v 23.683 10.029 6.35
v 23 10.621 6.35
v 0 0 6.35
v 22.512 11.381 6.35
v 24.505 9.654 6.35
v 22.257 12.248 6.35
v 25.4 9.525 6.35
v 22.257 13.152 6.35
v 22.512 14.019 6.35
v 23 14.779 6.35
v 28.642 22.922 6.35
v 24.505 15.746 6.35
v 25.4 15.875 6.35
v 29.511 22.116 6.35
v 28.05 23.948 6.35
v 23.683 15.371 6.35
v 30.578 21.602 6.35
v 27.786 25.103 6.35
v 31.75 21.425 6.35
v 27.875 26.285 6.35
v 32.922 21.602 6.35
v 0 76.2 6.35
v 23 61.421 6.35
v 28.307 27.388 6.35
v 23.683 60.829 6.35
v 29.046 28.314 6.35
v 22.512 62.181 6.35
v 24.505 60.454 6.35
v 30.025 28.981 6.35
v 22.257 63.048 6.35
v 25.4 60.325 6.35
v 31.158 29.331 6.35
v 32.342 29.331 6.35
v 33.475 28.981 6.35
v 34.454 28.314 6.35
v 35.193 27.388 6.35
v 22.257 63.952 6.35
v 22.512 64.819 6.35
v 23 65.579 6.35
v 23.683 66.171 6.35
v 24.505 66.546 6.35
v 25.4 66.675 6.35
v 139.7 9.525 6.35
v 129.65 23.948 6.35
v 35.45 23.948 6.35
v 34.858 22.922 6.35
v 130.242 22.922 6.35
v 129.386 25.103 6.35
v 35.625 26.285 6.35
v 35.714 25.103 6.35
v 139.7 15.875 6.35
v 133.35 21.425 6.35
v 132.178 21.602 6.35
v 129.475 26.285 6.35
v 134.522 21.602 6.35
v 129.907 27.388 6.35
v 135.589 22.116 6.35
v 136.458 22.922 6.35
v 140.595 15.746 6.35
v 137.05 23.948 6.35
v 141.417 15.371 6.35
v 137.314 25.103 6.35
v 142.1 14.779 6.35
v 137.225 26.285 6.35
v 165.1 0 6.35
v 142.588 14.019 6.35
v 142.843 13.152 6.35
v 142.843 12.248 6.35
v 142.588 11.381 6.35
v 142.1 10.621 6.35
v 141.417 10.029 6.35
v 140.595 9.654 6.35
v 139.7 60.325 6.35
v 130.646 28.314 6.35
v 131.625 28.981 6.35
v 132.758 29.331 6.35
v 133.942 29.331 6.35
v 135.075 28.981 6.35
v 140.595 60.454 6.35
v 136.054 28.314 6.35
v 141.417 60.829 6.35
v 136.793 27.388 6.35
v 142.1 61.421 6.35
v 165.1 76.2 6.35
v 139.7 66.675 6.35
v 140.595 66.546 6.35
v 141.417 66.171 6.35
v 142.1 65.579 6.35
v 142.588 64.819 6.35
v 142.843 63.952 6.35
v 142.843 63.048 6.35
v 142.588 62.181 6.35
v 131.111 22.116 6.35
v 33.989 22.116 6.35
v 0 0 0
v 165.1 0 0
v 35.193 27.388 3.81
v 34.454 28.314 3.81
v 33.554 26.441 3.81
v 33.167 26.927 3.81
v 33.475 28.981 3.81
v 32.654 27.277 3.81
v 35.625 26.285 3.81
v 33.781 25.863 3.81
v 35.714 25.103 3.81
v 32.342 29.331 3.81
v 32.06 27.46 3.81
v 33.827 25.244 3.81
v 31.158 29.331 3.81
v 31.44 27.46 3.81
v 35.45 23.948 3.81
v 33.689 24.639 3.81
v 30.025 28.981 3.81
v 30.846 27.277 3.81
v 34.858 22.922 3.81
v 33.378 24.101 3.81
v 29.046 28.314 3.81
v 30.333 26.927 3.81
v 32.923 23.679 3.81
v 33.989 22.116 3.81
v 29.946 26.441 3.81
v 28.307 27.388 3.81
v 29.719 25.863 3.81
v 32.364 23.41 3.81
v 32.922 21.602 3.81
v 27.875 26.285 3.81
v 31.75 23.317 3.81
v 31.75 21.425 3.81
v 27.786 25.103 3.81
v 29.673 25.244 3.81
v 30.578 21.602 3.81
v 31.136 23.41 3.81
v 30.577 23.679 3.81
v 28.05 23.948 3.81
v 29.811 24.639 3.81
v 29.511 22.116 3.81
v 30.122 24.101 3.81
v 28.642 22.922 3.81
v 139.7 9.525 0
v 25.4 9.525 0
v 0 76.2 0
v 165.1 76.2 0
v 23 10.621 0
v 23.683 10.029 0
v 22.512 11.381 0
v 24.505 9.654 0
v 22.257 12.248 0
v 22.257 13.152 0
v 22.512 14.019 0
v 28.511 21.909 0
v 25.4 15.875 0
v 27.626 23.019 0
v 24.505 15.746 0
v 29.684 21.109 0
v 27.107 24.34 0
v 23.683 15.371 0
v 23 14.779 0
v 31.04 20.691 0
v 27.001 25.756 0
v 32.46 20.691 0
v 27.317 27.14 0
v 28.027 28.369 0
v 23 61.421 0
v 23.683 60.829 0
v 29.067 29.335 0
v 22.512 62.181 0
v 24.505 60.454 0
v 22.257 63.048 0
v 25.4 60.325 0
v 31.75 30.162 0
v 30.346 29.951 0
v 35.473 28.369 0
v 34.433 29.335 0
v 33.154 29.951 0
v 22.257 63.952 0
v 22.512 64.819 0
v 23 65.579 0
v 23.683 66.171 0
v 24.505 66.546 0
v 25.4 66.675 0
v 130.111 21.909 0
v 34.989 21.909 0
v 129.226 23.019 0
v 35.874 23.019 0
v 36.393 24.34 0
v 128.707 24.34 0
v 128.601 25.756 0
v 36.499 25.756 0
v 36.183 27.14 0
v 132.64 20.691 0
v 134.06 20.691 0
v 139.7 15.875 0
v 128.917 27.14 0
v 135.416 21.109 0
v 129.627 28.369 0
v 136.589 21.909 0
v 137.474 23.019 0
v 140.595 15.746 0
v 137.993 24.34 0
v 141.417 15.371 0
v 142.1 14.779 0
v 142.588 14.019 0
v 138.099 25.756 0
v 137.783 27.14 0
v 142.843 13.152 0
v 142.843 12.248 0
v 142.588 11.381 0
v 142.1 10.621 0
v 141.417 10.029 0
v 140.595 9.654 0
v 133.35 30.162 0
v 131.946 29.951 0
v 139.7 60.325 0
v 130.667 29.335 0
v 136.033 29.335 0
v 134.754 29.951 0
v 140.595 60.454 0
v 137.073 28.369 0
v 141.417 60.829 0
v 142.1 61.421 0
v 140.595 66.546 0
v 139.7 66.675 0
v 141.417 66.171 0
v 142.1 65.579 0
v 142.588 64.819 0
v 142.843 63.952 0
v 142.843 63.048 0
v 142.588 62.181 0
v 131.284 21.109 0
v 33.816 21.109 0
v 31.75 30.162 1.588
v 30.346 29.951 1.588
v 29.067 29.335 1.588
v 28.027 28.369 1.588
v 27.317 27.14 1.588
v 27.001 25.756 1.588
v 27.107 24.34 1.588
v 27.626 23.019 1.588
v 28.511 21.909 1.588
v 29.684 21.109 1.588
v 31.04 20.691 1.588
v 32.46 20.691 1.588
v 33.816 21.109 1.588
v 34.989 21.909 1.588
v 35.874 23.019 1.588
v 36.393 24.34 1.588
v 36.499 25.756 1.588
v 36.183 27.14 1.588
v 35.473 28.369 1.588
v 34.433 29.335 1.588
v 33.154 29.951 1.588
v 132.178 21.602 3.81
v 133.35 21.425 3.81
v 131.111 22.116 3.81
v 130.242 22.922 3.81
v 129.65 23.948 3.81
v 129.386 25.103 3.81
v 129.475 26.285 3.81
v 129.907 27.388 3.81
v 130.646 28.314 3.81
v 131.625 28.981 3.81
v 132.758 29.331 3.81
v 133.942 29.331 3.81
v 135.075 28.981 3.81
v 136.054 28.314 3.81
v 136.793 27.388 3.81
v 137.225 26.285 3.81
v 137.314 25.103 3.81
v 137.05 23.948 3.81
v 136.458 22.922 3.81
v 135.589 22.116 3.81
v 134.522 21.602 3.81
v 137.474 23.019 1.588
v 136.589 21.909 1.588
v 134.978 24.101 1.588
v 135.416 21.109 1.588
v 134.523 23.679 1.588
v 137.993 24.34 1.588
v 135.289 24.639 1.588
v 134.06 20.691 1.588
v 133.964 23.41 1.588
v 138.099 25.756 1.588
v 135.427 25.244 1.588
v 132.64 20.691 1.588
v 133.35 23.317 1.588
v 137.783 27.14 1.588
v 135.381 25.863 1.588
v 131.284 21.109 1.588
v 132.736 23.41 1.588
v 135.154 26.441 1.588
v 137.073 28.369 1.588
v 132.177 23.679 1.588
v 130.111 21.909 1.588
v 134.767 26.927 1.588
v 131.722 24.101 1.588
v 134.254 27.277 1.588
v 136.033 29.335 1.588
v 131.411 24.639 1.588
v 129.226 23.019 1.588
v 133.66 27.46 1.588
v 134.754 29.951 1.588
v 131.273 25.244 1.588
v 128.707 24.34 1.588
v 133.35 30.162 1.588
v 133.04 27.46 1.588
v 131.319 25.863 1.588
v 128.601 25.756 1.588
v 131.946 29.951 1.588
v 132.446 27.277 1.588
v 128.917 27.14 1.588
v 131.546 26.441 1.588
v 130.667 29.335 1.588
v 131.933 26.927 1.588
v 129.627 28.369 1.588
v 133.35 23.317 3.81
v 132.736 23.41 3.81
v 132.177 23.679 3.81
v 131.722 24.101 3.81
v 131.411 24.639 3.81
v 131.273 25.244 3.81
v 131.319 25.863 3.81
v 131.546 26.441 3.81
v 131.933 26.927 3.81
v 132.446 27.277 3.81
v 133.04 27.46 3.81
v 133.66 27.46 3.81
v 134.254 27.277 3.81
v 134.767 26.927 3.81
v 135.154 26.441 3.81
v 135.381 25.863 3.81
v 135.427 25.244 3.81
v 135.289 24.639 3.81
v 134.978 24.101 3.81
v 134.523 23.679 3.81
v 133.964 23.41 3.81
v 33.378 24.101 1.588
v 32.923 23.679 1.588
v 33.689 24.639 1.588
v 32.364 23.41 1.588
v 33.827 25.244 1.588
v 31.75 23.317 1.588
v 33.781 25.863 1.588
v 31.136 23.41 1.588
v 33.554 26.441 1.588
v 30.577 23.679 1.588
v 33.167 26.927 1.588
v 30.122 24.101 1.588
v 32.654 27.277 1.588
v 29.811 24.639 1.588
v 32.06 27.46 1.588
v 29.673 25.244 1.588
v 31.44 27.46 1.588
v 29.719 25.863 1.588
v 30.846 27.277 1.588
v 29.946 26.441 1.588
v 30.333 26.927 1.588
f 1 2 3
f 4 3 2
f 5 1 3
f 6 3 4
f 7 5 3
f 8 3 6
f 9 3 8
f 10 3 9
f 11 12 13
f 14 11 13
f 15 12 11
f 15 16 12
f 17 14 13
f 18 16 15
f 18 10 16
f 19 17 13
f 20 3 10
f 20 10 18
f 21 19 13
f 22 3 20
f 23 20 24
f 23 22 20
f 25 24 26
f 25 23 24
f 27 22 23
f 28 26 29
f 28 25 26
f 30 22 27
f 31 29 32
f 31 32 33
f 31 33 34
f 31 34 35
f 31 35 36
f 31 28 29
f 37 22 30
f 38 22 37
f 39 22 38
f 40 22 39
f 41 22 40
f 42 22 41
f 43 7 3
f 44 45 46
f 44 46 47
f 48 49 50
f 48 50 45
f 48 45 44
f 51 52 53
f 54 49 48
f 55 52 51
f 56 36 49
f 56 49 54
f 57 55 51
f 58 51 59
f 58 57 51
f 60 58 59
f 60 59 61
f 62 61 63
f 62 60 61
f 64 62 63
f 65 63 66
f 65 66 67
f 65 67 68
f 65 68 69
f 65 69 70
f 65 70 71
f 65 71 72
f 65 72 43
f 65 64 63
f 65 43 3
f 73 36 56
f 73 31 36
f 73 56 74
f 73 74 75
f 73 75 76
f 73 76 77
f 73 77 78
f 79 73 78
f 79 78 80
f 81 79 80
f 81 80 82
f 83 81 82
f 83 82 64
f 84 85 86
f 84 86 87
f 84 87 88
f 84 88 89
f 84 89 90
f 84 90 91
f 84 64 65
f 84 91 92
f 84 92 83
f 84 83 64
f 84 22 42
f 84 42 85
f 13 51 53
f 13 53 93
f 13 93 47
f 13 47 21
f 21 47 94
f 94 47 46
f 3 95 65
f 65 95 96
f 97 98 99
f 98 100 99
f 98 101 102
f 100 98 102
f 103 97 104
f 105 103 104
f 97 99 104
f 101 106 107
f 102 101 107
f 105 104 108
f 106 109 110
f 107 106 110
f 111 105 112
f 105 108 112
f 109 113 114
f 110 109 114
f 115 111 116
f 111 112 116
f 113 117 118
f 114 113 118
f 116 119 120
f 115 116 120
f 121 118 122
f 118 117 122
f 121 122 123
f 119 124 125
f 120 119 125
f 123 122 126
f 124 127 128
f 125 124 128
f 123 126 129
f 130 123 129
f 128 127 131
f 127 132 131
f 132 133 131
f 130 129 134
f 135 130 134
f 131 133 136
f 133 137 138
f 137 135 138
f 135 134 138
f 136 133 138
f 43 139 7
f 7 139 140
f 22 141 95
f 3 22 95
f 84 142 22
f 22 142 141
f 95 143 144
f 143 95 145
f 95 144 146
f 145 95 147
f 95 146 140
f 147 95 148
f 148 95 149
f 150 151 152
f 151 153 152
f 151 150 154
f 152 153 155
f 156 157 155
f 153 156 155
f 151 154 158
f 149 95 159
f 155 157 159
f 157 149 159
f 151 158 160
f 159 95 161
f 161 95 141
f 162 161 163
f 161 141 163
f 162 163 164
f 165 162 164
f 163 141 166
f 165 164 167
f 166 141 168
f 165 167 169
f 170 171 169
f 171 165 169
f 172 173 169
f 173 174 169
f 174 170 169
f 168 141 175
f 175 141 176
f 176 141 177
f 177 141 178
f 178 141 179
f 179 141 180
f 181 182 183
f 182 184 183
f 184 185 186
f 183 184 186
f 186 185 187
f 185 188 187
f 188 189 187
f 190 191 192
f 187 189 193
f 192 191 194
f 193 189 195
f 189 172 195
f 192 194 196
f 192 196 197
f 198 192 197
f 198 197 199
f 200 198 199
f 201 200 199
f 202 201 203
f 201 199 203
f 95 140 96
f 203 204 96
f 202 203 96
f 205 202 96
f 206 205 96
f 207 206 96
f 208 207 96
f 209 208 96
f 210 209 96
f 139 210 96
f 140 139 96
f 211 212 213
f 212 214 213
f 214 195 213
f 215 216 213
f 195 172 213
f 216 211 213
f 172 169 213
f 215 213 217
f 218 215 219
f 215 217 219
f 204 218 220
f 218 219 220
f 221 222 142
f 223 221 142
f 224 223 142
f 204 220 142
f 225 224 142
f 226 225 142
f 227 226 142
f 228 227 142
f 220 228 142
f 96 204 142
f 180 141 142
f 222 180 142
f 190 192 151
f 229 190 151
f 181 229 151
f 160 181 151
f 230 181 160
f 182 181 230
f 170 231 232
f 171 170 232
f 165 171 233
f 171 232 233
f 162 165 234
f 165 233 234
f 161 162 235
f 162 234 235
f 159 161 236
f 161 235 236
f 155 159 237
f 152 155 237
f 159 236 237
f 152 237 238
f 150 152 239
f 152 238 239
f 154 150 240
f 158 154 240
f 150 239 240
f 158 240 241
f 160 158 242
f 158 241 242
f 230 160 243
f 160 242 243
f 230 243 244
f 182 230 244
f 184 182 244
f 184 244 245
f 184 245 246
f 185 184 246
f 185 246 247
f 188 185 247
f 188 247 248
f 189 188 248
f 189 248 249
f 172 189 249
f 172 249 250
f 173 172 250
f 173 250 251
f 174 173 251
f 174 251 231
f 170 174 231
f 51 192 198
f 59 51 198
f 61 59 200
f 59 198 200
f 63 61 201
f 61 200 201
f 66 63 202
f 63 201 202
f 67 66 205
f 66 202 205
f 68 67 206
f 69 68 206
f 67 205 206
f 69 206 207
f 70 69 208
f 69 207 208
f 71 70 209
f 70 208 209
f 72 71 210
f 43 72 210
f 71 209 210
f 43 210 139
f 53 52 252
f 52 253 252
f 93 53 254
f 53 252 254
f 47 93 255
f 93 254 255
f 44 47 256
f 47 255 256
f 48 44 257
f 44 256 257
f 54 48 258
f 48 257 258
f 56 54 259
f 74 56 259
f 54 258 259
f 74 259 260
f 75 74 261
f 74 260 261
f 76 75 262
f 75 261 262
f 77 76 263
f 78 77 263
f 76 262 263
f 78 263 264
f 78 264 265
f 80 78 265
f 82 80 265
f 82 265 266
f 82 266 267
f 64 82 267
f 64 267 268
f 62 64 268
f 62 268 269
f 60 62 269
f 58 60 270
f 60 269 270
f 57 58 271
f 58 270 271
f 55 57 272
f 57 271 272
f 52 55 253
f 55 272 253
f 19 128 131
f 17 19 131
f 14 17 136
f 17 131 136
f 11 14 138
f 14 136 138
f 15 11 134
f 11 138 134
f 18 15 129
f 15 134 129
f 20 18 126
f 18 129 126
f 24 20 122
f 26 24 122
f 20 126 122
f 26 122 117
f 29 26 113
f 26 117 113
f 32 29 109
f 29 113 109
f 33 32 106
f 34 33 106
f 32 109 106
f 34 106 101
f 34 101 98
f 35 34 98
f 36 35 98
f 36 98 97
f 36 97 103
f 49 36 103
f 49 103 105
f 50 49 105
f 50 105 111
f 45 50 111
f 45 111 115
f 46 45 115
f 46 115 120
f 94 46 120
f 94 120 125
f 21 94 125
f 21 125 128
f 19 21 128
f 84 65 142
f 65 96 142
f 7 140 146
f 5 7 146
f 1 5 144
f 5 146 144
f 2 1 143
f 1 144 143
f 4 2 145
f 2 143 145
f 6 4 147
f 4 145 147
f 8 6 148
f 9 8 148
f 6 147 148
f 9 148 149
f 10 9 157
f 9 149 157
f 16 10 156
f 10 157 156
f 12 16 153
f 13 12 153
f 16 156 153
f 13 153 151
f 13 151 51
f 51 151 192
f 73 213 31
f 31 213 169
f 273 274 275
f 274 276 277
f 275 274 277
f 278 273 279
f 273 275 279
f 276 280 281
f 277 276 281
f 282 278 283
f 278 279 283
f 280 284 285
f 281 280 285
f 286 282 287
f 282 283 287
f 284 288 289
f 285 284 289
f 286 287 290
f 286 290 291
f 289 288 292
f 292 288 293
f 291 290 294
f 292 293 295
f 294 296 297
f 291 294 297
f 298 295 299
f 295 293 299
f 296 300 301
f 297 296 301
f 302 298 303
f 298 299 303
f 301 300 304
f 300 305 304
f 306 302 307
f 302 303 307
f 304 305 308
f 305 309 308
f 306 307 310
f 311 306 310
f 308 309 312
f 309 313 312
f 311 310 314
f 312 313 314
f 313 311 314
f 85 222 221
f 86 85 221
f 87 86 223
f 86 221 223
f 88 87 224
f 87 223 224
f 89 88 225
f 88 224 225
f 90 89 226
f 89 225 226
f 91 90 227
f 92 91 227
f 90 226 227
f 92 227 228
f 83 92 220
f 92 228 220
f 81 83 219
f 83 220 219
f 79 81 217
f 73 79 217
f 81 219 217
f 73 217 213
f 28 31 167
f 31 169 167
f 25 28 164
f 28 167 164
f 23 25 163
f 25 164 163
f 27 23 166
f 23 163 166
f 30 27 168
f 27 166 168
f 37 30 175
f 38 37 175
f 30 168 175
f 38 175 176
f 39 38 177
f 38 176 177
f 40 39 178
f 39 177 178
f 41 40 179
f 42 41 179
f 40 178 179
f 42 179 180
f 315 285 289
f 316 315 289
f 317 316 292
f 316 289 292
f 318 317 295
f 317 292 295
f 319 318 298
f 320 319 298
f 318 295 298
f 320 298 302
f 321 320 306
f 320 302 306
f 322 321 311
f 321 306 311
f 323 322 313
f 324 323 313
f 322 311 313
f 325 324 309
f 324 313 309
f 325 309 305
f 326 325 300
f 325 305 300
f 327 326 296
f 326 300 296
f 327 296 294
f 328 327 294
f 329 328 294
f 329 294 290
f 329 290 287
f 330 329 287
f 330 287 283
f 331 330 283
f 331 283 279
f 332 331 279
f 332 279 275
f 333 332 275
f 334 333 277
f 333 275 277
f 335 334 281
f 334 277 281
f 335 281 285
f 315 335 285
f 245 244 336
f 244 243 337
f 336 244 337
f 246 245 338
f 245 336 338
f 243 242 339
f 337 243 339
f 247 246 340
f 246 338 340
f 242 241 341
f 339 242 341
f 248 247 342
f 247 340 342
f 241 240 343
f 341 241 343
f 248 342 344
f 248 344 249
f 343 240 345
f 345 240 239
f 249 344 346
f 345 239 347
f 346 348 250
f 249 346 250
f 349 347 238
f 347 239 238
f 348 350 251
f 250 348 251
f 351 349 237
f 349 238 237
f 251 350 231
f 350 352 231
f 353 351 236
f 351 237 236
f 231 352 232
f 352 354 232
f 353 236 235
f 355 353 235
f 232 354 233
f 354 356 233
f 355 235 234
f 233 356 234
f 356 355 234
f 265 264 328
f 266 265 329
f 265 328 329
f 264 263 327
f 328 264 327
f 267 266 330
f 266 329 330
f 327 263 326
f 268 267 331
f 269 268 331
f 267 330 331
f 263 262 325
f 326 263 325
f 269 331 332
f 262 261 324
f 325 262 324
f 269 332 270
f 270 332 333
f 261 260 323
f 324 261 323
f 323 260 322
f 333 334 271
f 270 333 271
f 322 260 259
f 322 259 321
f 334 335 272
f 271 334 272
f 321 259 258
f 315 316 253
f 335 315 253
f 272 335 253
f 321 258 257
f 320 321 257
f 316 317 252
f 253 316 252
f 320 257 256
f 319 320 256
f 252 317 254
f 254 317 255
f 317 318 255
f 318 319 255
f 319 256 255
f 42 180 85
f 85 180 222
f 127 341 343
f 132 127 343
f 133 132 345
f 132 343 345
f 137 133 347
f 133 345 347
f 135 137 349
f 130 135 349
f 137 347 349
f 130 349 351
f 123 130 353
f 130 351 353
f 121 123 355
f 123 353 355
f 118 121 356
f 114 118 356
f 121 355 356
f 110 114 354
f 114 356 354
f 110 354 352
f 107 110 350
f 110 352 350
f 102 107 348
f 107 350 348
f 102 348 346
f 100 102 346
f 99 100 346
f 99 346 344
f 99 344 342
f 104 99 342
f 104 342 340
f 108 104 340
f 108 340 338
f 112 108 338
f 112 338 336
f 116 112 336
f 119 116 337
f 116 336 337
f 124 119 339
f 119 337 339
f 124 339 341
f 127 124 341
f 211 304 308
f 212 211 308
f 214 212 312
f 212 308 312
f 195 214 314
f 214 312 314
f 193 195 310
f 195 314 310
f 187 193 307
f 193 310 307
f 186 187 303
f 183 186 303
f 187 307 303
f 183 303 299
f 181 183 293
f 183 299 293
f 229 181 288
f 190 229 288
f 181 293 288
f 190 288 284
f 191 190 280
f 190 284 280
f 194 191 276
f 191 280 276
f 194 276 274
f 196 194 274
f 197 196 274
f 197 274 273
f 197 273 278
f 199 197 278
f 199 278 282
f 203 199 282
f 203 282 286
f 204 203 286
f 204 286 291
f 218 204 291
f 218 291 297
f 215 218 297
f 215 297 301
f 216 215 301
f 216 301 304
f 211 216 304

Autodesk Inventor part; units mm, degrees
ref_plane "YZ Plane" through (0, 0, 0) normal (1, 0, 0) x (0, 1, 0)
ref_plane "XZ Plane" through (0, 0, 0) normal (0, 1, 0) x (-1, 0, 0)
ref_plane "XY Plane" through (0, 0, 0) normal (0, 0, 1) x (1, 0, 0)
sketch "Sketch1" plane through (0, 0, 0) normal (0, 0, 1) x (1, 0, 0)
  line L0 (0, 0) -> (165.1, 0)
  line L1 (165.1, 0) -> (165.1, 76.2)
  line L2 (165.1, 76.2) -> (0, 76.2)
  line L3 (0, 76.2) -> (0, 0)
  dimension "d0" = 165.1
  dimension "d1" = 76.2
extrude "Extrusion1" add sketch "Sketch1" along normal blind 6.35
sketch "Sketch3" plane through (0, 0, 6.35) normal (0, 0, 1) x (1, 0, 0)
  line L0 (31.75, 25.4) -> (133.35, 25.4)
  line L1 (0, 0) -> (165.1, 0) projected
  line L2 (0, 76.2) -> (0, 0) projected
  dimension "d14" = 101.6
  dimension "d15" = 25.4
  dimension "d16" = 31.75
hole "Hole1" at (31.75, 25.4, 6.35) at (133.35, 25.4, 6.35) direction (0, 0, -1) diameter 4.1656 depth 6.35 tip angle 118 counterbore diameter 7.9502 counterbore depth 2.54
sketch "Sketch4" plane through (0, 0, 0) normal (0, 0, -1) x (-1, 0, 0)
  line L0 (-139.7, 12.7) -> (-25.4, 12.7) construction
  line L1 (-139.7, 9.525) -> (-25.4, 9.525)
  line L2 (-25.4, 15.875) -> (-139.7, 15.875)
  arc A0 (-139.7, 15.875) -> (-139.7, 9.525) centre (-139.7, 12.7) ccw
  arc A1 (-25.4, 9.525) -> (-25.4, 15.875) centre (-25.4, 12.7) ccw
  line L3 (0, 76.2) -> (0, 0) projected
  line L4 (-139.7, 63.5) -> (-25.4, 63.5) construction
  line L5 (-139.7, 60.325) -> (-25.4, 60.325)
  line L6 (-25.4, 66.675) -> (-139.7, 66.675)
  arc A2 (-139.7, 66.675) -> (-139.7, 60.325) centre (-139.7, 63.5) ccw
  arc A3 (-25.4, 60.325) -> (-25.4, 66.675) centre (-25.4, 63.5) ccw
  line L7 (-165.1, 76.2) -> (0, 76.2) projected
  point P0 (-82.55, 12.7)
  point P1 (-82.55, 63.5)
  dimension "d24" = 6.35
  dimension "d25" = 25.4
  dimension "d26" = 114.3
  dimension "d27" = 6.35
  dimension "d28" = 50.8
  dimension "d29" = 12.7
  dimension "d32" = 114.3
extrude "Extrusion3" cut sketch "Sketch4" against normal blind 6.35
hole "Hole2" at (31.75, 25.4, 0) direction (0, 0, 1) diameter 9.525 depth 1.5875
hole "Hole4" at (133.35, 25.4, 0) direction (0, 0, 1) diameter 9.525 depth 1.5875
properties part number "bottom"
